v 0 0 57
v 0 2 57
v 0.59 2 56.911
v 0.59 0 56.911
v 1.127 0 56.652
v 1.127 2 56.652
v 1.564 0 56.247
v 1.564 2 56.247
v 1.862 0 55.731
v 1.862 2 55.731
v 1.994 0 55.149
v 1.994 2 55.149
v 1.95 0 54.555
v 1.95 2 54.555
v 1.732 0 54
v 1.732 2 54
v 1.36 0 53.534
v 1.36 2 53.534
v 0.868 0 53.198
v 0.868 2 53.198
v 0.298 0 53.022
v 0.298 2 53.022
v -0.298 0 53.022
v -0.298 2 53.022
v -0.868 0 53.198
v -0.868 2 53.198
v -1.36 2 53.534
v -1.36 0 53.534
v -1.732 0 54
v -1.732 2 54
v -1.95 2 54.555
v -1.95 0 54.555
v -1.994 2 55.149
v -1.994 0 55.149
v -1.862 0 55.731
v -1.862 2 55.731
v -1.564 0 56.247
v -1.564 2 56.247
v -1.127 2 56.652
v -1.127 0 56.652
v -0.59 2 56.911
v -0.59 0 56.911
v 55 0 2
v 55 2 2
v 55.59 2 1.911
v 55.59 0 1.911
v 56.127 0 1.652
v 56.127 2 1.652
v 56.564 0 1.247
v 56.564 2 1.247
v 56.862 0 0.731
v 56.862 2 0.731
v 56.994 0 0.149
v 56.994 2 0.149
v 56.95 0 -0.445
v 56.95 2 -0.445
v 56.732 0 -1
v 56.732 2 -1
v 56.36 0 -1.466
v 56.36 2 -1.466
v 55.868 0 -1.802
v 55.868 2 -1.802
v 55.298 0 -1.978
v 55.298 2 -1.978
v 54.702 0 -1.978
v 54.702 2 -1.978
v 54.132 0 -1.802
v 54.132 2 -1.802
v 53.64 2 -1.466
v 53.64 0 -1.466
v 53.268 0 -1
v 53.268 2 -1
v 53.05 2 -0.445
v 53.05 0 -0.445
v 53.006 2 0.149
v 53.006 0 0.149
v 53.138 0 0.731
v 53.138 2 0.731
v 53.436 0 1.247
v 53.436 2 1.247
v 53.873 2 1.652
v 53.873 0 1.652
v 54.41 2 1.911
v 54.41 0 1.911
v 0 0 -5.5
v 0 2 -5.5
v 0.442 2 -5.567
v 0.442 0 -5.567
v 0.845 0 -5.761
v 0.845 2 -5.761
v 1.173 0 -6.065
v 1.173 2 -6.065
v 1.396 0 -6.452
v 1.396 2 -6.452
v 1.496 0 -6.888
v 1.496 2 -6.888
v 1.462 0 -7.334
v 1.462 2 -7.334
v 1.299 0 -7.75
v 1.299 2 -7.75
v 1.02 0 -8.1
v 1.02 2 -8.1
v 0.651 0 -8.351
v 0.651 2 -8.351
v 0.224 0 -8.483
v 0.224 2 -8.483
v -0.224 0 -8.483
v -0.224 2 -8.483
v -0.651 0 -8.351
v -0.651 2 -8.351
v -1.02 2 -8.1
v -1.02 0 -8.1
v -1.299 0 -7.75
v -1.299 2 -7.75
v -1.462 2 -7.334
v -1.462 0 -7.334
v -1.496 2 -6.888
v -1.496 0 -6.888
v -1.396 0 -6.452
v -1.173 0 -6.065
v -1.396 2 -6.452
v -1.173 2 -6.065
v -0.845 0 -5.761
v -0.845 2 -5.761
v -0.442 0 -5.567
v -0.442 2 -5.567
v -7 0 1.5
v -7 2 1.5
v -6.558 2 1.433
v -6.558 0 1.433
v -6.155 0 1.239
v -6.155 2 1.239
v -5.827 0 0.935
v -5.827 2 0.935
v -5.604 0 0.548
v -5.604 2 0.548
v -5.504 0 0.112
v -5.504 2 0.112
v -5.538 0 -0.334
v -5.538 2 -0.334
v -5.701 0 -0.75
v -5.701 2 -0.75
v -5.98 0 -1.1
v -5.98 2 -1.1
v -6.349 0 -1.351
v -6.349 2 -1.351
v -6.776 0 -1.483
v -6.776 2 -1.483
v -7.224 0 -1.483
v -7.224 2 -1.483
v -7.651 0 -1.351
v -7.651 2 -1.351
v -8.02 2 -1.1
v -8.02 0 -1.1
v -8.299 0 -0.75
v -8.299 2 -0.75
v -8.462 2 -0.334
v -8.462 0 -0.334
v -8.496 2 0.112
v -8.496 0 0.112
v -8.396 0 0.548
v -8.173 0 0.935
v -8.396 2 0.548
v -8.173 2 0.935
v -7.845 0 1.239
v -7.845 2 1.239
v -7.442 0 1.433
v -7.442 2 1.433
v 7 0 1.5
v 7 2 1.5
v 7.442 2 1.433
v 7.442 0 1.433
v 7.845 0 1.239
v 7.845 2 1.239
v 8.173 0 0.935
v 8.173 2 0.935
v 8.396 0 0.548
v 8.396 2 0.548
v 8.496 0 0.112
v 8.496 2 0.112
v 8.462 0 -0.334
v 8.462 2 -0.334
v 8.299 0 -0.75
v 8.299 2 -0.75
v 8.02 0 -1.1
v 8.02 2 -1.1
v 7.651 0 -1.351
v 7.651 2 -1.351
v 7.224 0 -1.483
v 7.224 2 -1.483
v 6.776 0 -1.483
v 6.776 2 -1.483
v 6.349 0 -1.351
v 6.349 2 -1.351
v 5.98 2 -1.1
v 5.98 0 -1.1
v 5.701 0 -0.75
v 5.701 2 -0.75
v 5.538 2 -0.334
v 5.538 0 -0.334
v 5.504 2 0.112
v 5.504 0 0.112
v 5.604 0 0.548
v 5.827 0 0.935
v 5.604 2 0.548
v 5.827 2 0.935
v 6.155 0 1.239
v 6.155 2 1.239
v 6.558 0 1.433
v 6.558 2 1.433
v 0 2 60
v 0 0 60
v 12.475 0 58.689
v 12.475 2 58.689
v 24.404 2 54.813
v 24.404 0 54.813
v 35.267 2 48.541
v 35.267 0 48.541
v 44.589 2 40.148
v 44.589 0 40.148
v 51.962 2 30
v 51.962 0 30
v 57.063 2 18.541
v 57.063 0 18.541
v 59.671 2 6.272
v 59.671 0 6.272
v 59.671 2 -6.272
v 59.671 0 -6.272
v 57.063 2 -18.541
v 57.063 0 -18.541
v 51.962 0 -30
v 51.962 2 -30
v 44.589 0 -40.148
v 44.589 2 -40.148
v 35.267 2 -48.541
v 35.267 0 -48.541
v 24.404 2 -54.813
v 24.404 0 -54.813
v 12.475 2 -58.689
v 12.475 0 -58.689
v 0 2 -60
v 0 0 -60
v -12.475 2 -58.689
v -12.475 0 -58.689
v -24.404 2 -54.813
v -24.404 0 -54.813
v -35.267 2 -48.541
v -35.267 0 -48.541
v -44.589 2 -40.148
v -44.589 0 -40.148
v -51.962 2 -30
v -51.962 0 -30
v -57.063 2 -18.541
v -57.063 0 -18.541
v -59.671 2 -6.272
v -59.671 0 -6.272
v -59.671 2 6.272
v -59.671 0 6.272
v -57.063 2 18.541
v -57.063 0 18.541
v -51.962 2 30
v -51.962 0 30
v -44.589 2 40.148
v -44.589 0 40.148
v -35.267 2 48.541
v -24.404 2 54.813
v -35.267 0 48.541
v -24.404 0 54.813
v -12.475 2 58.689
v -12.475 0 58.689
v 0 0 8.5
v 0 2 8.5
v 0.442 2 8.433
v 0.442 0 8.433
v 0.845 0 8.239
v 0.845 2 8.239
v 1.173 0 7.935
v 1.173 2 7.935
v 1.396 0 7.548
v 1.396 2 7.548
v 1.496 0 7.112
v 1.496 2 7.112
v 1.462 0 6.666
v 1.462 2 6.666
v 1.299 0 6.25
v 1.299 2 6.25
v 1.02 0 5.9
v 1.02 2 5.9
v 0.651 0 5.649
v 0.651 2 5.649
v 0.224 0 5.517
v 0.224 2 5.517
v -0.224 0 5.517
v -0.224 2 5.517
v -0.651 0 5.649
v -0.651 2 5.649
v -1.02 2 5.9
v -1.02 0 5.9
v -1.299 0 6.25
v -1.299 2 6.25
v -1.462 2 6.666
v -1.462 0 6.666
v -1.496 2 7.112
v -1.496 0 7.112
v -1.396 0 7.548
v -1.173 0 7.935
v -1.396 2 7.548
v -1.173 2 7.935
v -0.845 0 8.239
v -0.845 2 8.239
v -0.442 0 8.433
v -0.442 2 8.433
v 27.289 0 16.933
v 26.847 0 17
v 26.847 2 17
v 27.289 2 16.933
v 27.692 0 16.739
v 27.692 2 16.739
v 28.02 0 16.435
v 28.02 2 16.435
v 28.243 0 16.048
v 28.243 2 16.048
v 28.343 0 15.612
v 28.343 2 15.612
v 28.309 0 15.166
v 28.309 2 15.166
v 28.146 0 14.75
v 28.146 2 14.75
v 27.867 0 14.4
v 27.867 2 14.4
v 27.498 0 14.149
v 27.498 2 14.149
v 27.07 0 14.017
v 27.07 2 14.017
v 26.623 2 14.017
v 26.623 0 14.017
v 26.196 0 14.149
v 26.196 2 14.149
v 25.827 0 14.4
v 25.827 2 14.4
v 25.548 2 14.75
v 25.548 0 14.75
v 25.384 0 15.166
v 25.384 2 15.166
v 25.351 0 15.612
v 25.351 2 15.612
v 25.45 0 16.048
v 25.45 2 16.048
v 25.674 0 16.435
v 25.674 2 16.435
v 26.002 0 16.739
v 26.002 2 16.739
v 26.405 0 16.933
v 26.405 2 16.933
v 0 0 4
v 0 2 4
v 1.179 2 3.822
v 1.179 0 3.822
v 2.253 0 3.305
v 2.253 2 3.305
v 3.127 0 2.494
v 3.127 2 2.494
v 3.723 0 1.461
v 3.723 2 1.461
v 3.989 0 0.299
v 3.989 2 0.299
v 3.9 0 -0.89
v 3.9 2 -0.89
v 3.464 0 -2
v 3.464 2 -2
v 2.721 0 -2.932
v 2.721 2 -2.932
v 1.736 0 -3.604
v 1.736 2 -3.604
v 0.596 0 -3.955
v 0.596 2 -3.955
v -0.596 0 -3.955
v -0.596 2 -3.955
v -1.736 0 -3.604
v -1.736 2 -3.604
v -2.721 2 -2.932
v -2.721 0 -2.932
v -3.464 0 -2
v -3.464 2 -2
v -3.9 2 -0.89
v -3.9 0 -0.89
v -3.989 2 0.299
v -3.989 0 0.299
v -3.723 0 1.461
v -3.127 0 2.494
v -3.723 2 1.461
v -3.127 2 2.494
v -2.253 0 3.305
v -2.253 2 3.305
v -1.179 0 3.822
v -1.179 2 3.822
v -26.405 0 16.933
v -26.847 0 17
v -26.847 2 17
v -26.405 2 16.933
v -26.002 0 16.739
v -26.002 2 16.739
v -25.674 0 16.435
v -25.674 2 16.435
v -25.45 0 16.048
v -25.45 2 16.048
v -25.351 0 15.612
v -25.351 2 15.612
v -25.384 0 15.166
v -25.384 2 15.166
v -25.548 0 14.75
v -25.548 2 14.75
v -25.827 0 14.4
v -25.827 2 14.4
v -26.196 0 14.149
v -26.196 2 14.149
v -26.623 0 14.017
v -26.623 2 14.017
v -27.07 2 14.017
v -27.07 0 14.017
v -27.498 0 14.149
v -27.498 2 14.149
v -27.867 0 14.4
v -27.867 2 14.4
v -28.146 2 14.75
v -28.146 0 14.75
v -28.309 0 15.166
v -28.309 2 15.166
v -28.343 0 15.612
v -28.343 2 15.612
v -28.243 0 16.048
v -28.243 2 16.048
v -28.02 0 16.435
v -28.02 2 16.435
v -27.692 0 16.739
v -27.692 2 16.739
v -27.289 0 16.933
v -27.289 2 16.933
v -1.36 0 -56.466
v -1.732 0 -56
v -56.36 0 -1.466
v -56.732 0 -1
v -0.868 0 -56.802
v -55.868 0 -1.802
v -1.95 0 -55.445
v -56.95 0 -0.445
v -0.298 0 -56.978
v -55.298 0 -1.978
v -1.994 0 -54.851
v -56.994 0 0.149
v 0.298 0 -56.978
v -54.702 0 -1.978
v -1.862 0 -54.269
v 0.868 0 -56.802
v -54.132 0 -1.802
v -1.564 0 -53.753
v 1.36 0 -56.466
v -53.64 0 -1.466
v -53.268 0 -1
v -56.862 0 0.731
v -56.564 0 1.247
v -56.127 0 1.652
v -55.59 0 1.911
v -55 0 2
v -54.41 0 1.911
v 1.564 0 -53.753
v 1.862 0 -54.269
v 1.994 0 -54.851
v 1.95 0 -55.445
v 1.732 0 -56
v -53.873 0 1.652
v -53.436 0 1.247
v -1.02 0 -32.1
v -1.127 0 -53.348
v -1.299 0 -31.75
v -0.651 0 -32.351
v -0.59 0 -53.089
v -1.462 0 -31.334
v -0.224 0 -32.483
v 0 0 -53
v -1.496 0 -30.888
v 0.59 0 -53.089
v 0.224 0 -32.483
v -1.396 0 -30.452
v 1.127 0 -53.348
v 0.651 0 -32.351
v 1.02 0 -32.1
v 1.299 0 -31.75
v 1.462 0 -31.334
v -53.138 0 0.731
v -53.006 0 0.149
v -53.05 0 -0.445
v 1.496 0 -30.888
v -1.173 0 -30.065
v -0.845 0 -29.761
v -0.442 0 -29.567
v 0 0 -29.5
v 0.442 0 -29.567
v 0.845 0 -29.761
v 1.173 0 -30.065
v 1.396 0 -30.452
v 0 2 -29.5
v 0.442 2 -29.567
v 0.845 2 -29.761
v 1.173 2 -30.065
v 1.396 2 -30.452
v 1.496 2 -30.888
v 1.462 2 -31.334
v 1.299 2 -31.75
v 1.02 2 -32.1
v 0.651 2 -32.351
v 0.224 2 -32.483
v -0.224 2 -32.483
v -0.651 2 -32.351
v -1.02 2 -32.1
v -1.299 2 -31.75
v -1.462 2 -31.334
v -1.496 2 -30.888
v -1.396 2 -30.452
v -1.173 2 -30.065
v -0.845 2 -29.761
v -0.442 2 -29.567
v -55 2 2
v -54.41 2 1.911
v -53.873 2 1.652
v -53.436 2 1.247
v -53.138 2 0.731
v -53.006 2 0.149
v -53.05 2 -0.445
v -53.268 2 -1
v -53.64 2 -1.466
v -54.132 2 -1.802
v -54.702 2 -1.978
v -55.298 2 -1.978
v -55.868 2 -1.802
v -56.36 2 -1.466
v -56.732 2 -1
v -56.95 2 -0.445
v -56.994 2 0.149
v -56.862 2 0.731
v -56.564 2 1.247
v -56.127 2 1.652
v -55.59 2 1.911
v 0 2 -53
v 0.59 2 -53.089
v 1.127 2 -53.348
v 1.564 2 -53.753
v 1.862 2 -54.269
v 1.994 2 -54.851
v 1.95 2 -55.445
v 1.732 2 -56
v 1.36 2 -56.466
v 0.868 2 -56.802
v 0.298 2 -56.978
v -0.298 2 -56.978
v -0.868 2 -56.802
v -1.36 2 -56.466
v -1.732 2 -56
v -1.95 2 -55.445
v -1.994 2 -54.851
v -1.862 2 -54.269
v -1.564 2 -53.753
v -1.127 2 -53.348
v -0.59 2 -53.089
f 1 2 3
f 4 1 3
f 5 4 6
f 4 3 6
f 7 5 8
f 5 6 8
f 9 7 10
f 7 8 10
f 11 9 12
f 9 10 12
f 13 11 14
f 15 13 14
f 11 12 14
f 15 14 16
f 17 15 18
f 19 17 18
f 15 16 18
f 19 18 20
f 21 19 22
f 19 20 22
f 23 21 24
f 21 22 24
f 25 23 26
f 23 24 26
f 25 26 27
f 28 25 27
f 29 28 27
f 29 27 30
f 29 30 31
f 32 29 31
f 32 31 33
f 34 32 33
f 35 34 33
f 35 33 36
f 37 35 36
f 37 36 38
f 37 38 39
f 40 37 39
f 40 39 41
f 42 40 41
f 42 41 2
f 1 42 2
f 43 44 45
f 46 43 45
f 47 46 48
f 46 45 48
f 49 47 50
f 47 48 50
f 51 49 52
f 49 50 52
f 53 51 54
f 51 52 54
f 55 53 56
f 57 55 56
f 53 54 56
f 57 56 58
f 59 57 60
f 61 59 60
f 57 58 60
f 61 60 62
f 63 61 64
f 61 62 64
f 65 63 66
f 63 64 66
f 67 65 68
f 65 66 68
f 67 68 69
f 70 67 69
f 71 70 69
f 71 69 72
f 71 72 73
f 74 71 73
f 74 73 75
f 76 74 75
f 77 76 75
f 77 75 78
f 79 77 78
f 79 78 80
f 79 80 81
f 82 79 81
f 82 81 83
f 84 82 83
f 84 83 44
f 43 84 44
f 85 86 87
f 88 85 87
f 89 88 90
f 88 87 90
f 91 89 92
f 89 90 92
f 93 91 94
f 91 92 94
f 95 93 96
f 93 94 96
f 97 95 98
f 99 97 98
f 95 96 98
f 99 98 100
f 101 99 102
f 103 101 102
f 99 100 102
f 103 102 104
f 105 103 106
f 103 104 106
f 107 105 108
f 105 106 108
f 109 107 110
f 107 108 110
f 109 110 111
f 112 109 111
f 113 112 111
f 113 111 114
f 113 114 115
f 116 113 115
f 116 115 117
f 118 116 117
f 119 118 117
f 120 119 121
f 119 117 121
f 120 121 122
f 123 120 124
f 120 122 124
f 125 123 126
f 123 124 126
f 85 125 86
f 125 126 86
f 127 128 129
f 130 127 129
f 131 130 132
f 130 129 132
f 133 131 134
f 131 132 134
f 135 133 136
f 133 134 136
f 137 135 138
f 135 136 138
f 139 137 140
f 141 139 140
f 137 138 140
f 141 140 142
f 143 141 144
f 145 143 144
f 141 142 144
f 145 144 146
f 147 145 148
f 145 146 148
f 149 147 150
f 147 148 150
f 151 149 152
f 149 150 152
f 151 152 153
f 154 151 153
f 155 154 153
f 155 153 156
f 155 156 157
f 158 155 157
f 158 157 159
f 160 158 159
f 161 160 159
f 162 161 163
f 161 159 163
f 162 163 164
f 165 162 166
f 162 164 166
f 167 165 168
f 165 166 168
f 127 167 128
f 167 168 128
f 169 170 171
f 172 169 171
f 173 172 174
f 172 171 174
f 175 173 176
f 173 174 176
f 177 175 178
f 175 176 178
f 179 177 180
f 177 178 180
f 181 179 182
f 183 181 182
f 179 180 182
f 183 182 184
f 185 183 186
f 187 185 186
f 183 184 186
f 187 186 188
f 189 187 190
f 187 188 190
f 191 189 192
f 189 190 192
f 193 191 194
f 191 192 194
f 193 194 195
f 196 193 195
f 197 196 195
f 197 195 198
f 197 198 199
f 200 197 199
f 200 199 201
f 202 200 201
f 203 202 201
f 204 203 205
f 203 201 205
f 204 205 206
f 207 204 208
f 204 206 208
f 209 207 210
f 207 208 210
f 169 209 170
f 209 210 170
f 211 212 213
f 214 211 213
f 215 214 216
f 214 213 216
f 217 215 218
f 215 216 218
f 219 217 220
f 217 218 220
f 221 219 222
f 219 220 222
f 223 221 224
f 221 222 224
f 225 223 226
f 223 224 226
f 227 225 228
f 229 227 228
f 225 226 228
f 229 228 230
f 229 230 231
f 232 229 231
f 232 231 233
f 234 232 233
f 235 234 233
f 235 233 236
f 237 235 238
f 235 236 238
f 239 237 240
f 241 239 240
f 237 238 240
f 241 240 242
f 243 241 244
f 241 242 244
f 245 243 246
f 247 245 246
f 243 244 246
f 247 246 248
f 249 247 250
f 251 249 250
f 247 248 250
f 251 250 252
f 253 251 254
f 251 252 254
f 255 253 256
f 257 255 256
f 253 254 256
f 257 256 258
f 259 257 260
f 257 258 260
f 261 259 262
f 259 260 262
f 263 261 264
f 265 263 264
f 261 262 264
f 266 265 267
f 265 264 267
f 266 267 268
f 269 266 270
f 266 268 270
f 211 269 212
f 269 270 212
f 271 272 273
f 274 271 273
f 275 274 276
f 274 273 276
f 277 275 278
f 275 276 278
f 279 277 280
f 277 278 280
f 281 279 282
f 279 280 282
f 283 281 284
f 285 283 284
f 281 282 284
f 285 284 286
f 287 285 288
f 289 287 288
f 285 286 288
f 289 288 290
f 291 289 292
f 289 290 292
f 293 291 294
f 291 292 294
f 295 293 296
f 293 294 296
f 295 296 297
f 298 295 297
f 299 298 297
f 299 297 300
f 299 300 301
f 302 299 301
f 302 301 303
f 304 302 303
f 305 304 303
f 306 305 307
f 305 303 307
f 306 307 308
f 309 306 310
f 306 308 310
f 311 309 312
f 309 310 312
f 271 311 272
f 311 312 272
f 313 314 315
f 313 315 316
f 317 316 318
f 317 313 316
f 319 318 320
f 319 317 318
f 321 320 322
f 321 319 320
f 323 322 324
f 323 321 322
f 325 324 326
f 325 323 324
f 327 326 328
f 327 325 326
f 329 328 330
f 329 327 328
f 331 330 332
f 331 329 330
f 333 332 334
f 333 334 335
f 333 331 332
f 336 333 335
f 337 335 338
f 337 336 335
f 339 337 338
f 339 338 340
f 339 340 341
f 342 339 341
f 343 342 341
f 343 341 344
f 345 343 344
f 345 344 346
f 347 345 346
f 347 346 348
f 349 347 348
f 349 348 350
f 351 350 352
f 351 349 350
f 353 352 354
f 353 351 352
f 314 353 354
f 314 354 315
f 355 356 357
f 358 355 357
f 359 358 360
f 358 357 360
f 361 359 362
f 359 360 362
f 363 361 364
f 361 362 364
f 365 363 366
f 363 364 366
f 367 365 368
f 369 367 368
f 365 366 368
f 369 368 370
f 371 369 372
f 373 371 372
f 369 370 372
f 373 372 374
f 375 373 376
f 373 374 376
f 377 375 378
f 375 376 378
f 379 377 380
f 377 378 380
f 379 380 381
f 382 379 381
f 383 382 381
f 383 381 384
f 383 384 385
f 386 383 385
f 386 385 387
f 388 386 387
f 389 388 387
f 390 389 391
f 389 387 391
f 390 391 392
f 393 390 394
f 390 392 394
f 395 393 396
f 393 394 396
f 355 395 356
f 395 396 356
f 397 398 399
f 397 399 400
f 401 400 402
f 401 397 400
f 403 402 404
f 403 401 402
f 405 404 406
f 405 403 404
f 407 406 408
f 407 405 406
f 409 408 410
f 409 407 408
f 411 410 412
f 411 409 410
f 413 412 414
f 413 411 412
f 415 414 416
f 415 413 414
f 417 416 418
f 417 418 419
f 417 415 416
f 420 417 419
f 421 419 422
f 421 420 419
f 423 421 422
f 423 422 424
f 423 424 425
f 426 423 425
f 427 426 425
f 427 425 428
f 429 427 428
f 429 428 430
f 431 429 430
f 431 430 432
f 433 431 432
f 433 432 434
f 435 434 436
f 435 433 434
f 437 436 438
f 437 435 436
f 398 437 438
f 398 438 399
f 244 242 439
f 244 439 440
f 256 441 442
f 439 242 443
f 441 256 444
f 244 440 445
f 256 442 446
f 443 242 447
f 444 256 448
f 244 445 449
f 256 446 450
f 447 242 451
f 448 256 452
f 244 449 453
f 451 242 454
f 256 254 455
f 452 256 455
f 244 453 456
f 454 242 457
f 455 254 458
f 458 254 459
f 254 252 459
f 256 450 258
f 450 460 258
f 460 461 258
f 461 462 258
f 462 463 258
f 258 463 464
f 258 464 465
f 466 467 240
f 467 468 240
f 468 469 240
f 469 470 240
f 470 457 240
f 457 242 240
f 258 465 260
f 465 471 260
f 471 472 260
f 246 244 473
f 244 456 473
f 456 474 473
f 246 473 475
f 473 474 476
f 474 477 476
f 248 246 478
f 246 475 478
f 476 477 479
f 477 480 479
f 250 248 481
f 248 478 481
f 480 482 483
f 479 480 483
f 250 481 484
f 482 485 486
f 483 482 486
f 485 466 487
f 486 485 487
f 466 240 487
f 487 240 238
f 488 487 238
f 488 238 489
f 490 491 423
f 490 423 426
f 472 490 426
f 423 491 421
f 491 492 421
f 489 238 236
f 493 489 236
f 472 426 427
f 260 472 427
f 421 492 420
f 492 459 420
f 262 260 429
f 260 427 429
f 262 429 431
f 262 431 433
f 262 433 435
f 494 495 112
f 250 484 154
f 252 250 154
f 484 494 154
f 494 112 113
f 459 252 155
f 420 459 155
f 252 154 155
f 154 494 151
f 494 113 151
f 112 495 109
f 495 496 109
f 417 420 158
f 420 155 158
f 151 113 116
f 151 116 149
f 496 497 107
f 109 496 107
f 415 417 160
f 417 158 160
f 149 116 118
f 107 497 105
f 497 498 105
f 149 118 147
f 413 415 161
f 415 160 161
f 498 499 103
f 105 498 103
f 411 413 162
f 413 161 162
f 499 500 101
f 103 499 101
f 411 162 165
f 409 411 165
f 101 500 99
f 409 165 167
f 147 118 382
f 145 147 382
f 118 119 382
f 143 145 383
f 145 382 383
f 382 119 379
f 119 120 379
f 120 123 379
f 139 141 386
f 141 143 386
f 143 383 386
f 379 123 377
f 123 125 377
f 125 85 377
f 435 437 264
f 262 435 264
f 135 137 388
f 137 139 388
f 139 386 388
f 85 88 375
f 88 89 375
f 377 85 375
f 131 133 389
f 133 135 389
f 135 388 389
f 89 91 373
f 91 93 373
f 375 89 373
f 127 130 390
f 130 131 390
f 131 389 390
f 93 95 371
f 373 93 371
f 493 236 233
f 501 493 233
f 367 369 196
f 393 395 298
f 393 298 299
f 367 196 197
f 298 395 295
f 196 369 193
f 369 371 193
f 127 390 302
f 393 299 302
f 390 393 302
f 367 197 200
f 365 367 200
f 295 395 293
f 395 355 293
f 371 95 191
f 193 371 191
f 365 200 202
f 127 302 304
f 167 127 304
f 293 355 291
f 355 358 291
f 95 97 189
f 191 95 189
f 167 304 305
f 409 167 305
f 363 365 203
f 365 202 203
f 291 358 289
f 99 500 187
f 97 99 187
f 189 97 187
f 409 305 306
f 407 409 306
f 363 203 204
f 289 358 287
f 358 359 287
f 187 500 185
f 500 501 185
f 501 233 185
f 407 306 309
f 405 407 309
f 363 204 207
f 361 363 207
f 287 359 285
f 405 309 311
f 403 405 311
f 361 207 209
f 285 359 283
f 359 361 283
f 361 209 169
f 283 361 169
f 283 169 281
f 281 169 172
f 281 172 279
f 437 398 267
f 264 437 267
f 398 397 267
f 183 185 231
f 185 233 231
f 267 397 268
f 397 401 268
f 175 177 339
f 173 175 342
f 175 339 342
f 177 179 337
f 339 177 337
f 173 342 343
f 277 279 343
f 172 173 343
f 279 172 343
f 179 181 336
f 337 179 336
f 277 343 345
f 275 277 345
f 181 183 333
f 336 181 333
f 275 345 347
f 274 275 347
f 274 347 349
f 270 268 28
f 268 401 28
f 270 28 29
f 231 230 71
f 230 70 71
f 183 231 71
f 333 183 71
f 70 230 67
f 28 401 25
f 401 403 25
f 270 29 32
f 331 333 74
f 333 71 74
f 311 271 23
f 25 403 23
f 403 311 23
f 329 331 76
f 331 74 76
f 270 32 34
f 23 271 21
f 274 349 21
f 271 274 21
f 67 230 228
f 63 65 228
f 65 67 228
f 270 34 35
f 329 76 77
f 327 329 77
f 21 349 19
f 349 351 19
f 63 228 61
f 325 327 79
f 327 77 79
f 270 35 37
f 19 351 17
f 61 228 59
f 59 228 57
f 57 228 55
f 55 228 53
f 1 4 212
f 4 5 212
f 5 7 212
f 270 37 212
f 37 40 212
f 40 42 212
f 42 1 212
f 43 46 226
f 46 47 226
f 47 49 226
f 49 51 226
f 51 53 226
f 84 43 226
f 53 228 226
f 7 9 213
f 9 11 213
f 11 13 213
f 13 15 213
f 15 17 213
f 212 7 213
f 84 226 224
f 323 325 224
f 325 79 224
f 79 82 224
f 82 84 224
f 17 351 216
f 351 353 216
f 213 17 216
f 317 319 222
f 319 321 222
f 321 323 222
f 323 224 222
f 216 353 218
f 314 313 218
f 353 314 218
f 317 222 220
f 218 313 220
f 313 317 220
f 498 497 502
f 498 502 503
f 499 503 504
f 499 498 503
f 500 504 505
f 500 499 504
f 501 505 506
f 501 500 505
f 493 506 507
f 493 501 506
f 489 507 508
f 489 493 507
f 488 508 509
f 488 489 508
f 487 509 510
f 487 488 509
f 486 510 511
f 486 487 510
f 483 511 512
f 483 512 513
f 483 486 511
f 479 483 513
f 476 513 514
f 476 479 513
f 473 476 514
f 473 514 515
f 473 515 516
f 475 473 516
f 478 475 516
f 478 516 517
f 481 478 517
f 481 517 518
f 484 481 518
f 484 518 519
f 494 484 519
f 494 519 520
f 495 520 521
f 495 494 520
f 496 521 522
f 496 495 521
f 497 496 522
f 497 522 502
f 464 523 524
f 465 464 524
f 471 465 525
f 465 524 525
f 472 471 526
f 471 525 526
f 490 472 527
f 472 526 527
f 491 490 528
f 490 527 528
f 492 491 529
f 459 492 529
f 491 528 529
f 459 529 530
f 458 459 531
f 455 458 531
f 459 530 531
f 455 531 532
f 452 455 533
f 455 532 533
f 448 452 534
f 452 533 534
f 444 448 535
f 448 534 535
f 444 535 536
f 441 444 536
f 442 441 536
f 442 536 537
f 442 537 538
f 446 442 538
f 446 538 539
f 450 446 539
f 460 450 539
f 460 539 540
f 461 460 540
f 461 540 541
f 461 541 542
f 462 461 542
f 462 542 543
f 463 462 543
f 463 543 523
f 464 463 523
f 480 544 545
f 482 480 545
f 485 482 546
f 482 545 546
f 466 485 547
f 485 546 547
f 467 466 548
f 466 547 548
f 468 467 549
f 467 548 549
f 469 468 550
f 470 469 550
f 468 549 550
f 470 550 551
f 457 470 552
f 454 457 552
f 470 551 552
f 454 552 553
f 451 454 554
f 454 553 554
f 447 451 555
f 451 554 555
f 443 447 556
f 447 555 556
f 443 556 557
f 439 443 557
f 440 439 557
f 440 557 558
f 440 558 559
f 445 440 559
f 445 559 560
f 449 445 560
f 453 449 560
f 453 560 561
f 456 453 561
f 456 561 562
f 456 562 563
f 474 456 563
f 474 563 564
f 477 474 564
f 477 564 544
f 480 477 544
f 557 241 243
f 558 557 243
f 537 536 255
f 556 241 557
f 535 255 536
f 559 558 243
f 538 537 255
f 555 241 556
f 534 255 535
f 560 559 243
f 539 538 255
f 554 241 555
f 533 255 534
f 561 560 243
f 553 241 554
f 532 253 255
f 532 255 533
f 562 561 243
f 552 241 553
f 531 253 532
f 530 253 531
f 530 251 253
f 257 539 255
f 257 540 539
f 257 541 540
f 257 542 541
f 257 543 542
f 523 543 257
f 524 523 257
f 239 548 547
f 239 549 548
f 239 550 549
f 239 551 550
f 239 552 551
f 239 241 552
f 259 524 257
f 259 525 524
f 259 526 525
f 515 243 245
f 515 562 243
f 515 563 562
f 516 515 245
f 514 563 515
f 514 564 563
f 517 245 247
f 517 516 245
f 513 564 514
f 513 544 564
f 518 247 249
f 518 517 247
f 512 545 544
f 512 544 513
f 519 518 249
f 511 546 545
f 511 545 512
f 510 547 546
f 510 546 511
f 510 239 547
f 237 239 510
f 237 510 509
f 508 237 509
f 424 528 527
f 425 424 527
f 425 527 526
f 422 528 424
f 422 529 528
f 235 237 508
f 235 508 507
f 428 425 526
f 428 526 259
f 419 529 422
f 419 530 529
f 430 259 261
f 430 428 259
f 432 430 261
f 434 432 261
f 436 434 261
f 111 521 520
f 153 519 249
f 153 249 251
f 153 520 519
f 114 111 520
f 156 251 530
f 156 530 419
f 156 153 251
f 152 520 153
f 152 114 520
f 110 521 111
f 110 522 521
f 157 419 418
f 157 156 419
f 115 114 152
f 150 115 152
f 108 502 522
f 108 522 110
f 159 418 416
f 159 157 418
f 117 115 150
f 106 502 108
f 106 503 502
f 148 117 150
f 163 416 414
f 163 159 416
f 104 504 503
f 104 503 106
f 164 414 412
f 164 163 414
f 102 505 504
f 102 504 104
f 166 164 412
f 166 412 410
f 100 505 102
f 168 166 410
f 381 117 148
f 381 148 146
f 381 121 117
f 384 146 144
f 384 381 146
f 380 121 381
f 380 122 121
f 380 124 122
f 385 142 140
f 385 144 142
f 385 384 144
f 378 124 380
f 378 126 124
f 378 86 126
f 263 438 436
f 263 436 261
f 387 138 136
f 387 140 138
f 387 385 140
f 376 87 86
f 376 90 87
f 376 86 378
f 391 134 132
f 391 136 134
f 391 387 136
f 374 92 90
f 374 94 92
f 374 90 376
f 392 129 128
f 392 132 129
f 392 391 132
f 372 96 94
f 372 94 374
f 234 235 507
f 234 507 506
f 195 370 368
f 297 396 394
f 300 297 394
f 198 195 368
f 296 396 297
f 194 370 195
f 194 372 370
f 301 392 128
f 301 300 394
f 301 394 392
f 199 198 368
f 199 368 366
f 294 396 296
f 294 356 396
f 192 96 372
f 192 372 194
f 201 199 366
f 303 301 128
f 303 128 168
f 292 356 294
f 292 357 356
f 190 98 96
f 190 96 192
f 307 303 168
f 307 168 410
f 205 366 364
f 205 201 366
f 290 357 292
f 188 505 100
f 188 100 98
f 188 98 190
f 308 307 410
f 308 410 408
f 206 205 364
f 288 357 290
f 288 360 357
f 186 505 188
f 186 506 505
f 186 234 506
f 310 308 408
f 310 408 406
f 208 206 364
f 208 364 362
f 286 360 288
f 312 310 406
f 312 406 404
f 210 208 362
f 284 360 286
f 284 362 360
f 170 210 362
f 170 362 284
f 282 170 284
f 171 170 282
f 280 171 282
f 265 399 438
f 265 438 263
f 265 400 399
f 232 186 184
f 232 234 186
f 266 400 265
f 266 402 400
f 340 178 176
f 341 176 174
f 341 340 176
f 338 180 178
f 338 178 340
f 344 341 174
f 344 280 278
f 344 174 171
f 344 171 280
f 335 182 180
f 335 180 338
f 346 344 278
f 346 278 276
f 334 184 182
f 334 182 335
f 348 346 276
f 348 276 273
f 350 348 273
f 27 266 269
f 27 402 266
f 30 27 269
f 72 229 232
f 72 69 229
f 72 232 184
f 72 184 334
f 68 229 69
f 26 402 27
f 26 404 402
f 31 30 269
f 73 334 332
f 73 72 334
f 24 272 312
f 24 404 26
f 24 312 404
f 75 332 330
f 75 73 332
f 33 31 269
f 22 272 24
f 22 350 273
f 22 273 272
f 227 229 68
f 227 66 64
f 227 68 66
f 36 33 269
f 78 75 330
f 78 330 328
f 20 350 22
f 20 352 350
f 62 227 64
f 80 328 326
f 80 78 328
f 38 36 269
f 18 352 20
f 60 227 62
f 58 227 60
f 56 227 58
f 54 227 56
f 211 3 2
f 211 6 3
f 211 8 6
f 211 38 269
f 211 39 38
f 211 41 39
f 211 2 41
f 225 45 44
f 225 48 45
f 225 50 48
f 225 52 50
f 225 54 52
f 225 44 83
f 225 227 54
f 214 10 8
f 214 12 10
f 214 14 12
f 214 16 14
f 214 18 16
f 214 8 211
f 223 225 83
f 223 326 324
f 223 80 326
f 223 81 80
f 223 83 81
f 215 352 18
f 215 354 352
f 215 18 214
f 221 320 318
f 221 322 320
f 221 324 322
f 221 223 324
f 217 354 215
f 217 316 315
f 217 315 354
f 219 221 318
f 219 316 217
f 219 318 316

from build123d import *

# Parameters (mm, degrees)
SKETCH_1_R          = 60
SKETCH_1_R_2        = 1.5
EXTRUDE_1_DEPTH     = 2
SKETCH_2_R          = 4
SKETCH_2_R_2        = 1.5
CUT_EXTRUDE_1_DEPTH = 2
SKETCH_3_R          = 2
CUT_EXTRUDE_2_DEPTH = 10


with BuildPart() as part:
    # 草图1 → 凸台-拉伸1 (new body)
    with BuildSketch(Plane(origin=(0, 0, 0), x_dir=(1, 0, 0), z_dir=(0, 1, 0))):
        with Locations(Location((0, 0, 0), (0, 0, 270))):
            Circle(SKETCH_1_R)
        with Locations(Location((0, 31, 0), (0, 0, 270))):
            Circle(SKETCH_1_R_2, mode=Mode.SUBTRACT)
        with Locations(Location((26.846787517, -15.5, 0), (0, 0, 270))):
            Circle(SKETCH_1_R_2, mode=Mode.SUBTRACT)
        with Locations(Location((-26.846787517, -15.5, 0), (0, 0, 270))):
            Circle(SKETCH_1_R_2, mode=Mode.SUBTRACT)
    extrude(amount=EXTRUDE_1_DEPTH)

    # 草图2 → 切除-拉伸1 (cut)
    with BuildSketch(Plane(origin=(0, 2, 0), x_dir=(1, 0, 0), z_dir=(0, 1, 0))):
        with Locations(Location((0, 0, 0), (0, 0, 270))):
            Circle(SKETCH_2_R)
        with Locations(Location((0, 7, 0), (0, 0, 270))):
            Circle(SKETCH_2_R_2)
        with Locations(Location((7, 0, 0), (0, 0, 270))):
            Circle(SKETCH_2_R_2)
        with Locations(Location((0, -7, 0), (0, 0, 270))):
            Circle(SKETCH_2_R_2)
        with Locations(Location((-7, 0, 0), (0, 0, 270))):
            Circle(SKETCH_2_R_2)
    extrude(amount=-CUT_EXTRUDE_1_DEPTH, mode=Mode.SUBTRACT)

    # 草图3 → 切除-拉伸2 (cut)
    with BuildSketch(Plane(origin=(0, 2, 0), x_dir=(1, 0, 0), z_dir=(0, 1, 0))):
        with Locations(Location((0, 55, 0), (0, 0, 270))):
            Circle(SKETCH_3_R)
        with Locations(Location((55, 0, 0), (0, 0, 270))):
            Circle(SKETCH_3_R)
        with Locations(Location((0, -55, 0), (0, 0, 270))):
            Circle(SKETCH_3_R)
        with Locations(Location((-55, 0, 0), (0, 0, 270))):
            Circle(SKETCH_3_R)
    extrude(amount=-CUT_EXTRUDE_2_DEPTH, mode=Mode.SUBTRACT)


solid = part.part
